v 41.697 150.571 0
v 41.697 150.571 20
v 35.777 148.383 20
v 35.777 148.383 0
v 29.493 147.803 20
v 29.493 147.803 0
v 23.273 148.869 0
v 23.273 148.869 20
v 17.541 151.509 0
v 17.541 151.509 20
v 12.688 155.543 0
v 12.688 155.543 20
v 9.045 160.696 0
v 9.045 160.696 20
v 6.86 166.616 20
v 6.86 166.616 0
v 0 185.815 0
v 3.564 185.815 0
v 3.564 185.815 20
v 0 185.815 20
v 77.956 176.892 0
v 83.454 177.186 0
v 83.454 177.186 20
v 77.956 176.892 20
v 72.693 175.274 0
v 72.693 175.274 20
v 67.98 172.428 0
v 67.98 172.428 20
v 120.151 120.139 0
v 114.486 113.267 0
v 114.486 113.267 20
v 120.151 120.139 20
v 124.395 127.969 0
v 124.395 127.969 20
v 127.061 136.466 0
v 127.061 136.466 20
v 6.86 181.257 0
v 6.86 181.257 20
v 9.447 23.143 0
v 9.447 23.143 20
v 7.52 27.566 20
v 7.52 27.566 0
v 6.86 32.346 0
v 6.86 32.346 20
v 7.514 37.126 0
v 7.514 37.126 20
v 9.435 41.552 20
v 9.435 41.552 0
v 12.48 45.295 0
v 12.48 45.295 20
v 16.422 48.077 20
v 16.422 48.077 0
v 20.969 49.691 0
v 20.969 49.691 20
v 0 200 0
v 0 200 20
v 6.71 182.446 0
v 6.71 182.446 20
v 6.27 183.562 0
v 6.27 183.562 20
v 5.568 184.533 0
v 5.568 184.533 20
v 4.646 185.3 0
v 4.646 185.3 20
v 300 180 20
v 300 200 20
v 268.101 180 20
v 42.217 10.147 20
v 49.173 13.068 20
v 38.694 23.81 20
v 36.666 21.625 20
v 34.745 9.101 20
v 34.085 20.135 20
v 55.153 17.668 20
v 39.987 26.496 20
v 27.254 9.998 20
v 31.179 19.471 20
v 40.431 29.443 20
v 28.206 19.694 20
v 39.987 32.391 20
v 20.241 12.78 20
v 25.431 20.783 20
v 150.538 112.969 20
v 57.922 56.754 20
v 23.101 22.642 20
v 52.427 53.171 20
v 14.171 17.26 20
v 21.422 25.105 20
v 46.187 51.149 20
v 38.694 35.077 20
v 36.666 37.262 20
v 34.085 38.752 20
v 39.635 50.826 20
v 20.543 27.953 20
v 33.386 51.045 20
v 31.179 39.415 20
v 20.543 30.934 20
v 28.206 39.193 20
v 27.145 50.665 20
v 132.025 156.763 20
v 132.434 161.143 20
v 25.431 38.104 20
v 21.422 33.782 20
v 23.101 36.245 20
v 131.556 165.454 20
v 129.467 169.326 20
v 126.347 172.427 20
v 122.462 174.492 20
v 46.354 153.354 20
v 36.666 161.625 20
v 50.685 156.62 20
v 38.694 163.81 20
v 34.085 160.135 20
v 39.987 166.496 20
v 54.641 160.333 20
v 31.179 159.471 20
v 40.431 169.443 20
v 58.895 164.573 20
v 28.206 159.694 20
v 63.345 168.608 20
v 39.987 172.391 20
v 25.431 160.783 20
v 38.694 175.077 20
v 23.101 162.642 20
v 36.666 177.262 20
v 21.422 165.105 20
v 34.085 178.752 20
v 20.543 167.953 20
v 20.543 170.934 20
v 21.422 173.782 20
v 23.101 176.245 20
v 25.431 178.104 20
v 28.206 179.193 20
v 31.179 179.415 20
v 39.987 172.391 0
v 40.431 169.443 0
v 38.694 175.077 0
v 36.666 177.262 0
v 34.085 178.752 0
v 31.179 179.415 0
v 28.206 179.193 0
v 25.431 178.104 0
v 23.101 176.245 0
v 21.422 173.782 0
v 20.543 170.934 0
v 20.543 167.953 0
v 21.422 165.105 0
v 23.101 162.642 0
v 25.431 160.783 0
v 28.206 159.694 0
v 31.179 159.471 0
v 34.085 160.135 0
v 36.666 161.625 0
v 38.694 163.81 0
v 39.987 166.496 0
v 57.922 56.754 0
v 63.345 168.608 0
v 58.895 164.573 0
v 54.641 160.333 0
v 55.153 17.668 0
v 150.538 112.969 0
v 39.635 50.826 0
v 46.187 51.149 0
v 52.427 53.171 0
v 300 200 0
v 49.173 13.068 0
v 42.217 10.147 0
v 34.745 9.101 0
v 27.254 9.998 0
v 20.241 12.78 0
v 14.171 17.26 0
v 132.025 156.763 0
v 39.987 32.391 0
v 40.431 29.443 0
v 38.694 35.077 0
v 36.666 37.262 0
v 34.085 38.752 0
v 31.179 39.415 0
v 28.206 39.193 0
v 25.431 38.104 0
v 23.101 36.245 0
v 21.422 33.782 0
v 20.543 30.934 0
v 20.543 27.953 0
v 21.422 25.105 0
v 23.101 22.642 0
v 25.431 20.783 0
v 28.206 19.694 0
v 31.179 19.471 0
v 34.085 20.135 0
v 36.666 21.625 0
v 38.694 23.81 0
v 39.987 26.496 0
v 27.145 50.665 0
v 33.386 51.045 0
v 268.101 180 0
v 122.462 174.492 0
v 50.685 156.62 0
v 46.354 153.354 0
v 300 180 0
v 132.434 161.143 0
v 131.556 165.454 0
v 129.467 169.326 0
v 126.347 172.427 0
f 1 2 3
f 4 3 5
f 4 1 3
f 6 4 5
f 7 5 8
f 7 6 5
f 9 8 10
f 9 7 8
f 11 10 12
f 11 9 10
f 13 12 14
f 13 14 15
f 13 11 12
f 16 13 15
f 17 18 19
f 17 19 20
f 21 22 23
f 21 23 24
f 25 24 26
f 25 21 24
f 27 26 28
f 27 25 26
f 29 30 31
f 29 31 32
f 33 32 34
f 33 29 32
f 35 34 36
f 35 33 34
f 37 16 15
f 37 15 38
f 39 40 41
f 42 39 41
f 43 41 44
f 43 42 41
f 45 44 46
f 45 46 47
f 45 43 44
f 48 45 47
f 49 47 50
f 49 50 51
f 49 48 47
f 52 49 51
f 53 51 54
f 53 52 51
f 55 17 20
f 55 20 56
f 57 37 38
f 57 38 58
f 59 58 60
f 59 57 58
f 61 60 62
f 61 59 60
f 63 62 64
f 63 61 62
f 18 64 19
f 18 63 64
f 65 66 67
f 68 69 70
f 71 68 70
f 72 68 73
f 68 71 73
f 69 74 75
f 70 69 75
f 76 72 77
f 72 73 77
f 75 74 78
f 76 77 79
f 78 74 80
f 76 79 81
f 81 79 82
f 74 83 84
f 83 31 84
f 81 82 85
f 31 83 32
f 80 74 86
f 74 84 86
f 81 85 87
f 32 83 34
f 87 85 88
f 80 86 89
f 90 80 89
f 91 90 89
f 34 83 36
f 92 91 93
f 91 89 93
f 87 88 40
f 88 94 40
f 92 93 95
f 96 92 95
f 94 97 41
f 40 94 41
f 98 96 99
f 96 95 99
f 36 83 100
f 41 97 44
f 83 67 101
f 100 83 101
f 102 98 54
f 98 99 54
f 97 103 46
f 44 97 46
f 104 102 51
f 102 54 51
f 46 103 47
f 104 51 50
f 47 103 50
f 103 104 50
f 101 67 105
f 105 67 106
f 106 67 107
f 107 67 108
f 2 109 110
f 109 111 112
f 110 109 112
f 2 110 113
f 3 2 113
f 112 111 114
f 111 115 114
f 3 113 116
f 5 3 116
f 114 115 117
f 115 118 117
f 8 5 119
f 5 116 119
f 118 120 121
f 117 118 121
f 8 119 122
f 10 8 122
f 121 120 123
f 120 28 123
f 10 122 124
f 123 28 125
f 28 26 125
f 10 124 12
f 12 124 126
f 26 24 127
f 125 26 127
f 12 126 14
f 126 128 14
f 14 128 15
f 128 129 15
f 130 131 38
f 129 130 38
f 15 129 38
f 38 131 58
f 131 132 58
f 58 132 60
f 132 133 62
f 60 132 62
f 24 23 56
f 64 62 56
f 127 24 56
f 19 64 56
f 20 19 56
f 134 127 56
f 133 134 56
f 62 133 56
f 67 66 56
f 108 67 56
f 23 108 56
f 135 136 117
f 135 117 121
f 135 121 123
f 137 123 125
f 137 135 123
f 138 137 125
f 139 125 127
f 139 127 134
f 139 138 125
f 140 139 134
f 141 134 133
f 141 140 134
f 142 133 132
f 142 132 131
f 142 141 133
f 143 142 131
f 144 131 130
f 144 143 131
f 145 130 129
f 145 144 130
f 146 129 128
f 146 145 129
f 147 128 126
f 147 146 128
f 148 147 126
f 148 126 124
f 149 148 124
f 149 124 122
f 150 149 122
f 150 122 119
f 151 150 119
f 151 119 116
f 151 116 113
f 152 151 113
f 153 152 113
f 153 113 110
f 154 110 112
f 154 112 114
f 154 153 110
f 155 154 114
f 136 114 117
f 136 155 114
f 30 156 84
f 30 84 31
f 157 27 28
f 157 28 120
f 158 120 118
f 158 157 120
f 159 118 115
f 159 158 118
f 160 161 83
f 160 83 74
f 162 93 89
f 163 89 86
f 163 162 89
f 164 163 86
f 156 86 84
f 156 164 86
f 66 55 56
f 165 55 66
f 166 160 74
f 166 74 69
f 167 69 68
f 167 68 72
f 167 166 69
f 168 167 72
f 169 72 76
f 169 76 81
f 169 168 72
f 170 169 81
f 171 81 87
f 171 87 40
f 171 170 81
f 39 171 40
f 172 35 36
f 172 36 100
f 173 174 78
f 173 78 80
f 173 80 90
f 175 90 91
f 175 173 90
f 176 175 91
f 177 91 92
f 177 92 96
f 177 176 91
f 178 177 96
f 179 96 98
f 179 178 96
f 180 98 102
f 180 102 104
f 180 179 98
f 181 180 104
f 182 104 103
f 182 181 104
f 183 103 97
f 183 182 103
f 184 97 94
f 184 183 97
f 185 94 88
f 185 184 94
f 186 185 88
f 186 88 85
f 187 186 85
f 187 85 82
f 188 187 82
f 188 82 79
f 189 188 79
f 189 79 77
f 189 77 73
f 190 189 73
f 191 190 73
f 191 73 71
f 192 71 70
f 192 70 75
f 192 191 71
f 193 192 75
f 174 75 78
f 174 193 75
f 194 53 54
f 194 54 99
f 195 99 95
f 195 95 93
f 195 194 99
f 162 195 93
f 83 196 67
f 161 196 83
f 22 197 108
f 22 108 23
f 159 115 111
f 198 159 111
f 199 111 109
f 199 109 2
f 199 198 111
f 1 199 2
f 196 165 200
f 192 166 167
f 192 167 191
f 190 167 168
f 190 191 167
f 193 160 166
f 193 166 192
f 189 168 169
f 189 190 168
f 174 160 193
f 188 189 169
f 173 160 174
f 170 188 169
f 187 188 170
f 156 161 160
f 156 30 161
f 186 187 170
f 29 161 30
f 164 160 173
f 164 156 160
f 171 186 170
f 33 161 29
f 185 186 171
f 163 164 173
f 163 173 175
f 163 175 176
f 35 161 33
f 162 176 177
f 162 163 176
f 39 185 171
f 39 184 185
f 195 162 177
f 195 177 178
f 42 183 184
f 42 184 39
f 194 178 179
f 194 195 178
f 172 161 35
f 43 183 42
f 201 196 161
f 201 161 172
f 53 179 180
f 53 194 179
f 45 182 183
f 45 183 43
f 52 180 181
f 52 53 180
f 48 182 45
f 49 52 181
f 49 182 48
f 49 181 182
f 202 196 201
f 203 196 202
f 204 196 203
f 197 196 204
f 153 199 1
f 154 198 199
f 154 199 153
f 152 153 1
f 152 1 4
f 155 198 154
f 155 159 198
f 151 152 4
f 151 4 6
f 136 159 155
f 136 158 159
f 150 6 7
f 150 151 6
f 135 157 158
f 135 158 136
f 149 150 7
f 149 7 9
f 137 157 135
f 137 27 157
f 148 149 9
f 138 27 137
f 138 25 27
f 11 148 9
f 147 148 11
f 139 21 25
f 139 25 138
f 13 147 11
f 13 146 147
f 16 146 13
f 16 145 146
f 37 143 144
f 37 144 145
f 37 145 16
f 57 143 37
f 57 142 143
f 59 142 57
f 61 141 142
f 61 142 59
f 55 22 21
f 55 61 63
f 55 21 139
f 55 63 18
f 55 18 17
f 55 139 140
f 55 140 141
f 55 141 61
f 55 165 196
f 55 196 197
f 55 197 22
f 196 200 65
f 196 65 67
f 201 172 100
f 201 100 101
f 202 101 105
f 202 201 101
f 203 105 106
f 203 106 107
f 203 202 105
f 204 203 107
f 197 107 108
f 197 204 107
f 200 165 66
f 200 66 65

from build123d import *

# Parameters (mm, degrees)
SZKIC2_R                    = 10
DODANIE_WYCI_GNI_CIE2_DEPTH = 20


with BuildPart() as part:
    # Szkic2 → Dodanie-wyciągnięcie2 (new body)
    with BuildSketch(Plane.XY):
        with BuildLine():
            Line((0, 185.8153975), (0, 200))
            Line((0, 200), (300, 200))
            Line((300, 200), (300, 179.99999))
            Line((300, 179.99999), (268.100984266, 179.99999))
            Line((268.100984266, 179.99999), (150.537685313, 112.968737031))
            Line((150.537685313, 112.968737031), (55.152827757, 17.668229265))
            ThreePointArc((55.152827757, 17.668229265), (30.970417819, 9.307465427), (9.446642737, 23.142870322))
            ThreePointArc((9.446642737, 23.142870322), (8.323346954, 39.404883236), (20.969056487, 49.690839091))
            ThreePointArc((20.969056487, 49.690839091), (30.26105361, 50.929938535), (39.634727212, 50.825913662))
            ThreePointArc((39.634727212, 50.825913662), (49.37359719, 51.953421869), (57.922039747, 56.753525311))
            Line((57.922039747, 56.753525311), (114.485527726, 113.266993629))
            ThreePointArc((114.485527726, 113.266993629), (122.461819258, 123.951300931), (127.060971476, 136.466229937))
            Line((127.060971476, 136.466229937), (132.025285125, 156.762570766))
            ThreePointArc((132.025285125, 156.762570766), (130.65411111, 167.466839441), (122.461819258, 174.491641238))
            Line((122.461819258, 174.491641238), (83.453647812, 177.186358886))
            ThreePointArc((83.453647812, 177.186358886), (75.274757646, 176.24414951), (67.979862212, 172.427540613))
            ThreePointArc((67.979862212, 172.427540613), (61.096304048, 166.616485937), (54.641338034, 160.332765448))
            ThreePointArc((54.641338034, 160.332765448), (48.563505303, 154.928947374), (41.697006274, 150.570909792))
            ThreePointArc((41.697006274, 150.570909792), (20.320793886, 150.001184012), (6.859784063, 166.616485937))
            Line((6.859784063, 166.616485937), (6.859784063, 181.256700403))
            ThreePointArc((6.859784063, 181.256700403), (5.949401229, 184.069477829), (3.56355164, 185.8153975))
            Line((3.56355164, 185.8153975), (0, 185.8153975))
        make_face()
        with Locations((30.431430438, 29.443458524)):
            Circle(SZKIC2_R, mode=Mode.SUBTRACT)
        with Locations((30.431430438, 169.443458524)):
            Circle(SZKIC2_R, mode=Mode.SUBTRACT)
    extrude(amount=DODANIE_WYCI_GNI_CIE2_DEPTH)


solid = part.part
